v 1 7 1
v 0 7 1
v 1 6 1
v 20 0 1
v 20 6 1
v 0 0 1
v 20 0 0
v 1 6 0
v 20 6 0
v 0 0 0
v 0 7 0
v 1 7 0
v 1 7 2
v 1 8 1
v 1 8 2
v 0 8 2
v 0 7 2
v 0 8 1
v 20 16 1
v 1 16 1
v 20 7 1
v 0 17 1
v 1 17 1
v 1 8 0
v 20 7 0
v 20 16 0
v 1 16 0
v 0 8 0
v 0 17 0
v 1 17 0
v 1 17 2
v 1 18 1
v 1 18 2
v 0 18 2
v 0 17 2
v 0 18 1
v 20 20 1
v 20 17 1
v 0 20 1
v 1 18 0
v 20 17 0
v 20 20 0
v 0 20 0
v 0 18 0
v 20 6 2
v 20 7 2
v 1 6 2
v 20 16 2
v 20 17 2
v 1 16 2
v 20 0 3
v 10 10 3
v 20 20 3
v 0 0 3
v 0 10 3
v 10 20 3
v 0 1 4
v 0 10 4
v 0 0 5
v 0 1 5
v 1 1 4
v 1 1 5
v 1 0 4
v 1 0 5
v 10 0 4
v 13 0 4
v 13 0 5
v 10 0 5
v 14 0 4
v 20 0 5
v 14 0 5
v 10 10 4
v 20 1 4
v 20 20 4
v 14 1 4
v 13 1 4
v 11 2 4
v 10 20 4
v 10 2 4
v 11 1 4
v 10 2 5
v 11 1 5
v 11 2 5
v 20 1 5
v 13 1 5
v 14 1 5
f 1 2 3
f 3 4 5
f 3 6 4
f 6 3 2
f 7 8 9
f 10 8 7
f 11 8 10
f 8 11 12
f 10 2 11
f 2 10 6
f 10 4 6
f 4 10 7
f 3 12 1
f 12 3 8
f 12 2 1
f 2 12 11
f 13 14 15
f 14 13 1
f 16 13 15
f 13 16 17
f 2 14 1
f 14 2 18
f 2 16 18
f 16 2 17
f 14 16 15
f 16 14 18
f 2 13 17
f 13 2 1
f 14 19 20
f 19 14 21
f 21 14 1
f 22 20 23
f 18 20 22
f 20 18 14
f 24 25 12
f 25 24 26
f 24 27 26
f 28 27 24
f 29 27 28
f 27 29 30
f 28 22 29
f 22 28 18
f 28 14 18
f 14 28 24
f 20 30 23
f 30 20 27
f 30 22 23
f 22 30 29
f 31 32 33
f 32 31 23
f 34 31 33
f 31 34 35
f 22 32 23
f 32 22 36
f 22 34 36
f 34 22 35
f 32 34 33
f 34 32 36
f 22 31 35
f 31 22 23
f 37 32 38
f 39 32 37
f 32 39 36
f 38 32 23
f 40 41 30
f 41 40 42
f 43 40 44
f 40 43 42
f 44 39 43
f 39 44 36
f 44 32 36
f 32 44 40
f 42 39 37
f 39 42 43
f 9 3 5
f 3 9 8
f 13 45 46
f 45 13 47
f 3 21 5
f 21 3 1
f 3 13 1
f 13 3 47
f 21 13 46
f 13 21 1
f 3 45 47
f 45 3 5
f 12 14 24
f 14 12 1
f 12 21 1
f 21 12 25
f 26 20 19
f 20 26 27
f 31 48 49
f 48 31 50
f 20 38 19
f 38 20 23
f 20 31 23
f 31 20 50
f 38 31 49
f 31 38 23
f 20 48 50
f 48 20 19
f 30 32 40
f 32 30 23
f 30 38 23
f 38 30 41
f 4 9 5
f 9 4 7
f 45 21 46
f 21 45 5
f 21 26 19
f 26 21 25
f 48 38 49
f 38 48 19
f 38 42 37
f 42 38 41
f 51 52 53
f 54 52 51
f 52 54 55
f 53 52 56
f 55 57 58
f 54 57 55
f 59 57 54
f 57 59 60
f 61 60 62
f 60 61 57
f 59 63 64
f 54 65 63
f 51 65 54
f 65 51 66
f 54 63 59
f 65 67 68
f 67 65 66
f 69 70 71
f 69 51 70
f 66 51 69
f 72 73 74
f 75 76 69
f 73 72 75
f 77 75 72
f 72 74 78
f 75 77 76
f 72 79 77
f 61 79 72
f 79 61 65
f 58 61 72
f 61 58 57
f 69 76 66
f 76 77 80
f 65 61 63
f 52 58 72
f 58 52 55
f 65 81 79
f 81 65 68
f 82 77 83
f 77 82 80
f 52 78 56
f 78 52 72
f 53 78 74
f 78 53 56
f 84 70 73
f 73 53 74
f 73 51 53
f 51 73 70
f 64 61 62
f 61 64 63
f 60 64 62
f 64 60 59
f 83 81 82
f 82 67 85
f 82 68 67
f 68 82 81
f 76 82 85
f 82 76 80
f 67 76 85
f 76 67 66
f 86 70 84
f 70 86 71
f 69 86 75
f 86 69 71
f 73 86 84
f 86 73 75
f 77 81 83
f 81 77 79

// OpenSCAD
union() {
    translate([0, 0, 0]) cube([1, 1, 1]);
    translate([0, 1, 0]) cube([1, 1, 1]);
    translate([0, 2, 0]) cube([1, 1, 1]);
    translate([0, 3, 0]) cube([1, 1, 1]);
    translate([0, 4, 0]) cube([1, 1, 1]);
    translate([0, 5, 0]) cube([1, 1, 1]);
    translate([0, 6, 0]) cube([1, 1, 1]);
    translate([0, 7, 1]) cube([1, 1, 1]);
    translate([0, 8, 0]) cube([1, 1, 1]);
    translate([0, 9, 0]) cube([1, 1, 1]);
    translate([0, 10, 0]) cube([1, 1, 1]);
    translate([0, 11, 0]) cube([1, 1, 1]);
    translate([0, 12, 0]) cube([1, 1, 1]);
    translate([0, 13, 0]) cube([1, 1, 1]);
    translate([0, 14, 0]) cube([1, 1, 1]);
    translate([0, 15, 0]) cube([1, 1, 1]);
    translate([0, 16, 0]) cube([1, 1, 1]);
    translate([0, 17, 1]) cube([1, 1, 1]);
    translate([0, 18, 0]) cube([1, 1, 1]);
    translate([0, 19, 0]) cube([1, 1, 1]);
    translate([1, 0, 0]) cube([1, 1, 1]);
    translate([1, 1, 0]) cube([1, 1, 1]);
    translate([1, 2, 0]) cube([1, 1, 1]);
    translate([1, 3, 0]) cube([1, 1, 1]);
    translate([1, 4, 0]) cube([1, 1, 1]);
    translate([1, 5, 0]) cube([1, 1, 1]);
    translate([1, 6, 1]) cube([1, 1, 1]);
    translate([1, 7, 0]) cube([1, 1, 1]);
    translate([1, 8, 0]) cube([1, 1, 1]);
    translate([1, 9, 0]) cube([1, 1, 1]);
    translate([1, 10, 0]) cube([1, 1, 1]);
    translate([1, 11, 0]) cube([1, 1, 1]);
    translate([1, 12, 0]) cube([1, 1, 1]);
    translate([1, 13, 0]) cube([1, 1, 1]);
    translate([1, 14, 0]) cube([1, 1, 1]);
    translate([1, 15, 0]) cube([1, 1, 1]);
    translate([1, 16, 1]) cube([1, 1, 1]);
    translate([1, 17, 0]) cube([1, 1, 1]);
    translate([1, 18, 0]) cube([1, 1, 1]);
    translate([1, 19, 0]) cube([1, 1, 1]);
    translate([2, 0, 0]) cube([1, 1, 1]);
    translate([2, 1, 0]) cube([1, 1, 1]);
    translate([2, 2, 0]) cube([1, 1, 1]);
    translate([2, 3, 0]) cube([1, 1, 1]);
    translate([2, 4, 0]) cube([1, 1, 1]);
    translate([2, 5, 0]) cube([1, 1, 1]);
    translate([2, 6, 1]) cube([1, 1, 1]);
    translate([2, 7, 0]) cube([1, 1, 1]);
    translate([2, 8, 0]) cube([1, 1, 1]);
    translate([2, 9, 0]) cube([1, 1, 1]);
    translate([2, 10, 0]) cube([1, 1, 1]);
    translate([2, 11, 0]) cube([1, 1, 1]);
    translate([2, 12, 0]) cube([1, 1, 1]);
    translate([2, 13, 0]) cube([1, 1, 1]);
    translate([2, 14, 0]) cube([1, 1, 1]);
    translate([2, 15, 0]) cube([1, 1, 1]);
    translate([2, 16, 1]) cube([1, 1, 1]);
    translate([2, 17, 0]) cube([1, 1, 1]);
    translate([2, 18, 0]) cube([1, 1, 1]);
    translate([2, 19, 0]) cube([1, 1, 1]);
    translate([3, 0, 0]) cube([1, 1, 1]);
    translate([3, 1, 0]) cube([1, 1, 1]);
    translate([3, 2, 0]) cube([1, 1, 1]);
    translate([3, 3, 0]) cube([1, 1, 1]);
    translate([3, 4, 0]) cube([1, 1, 1]);
    translate([3, 5, 0]) cube([1, 1, 1]);
    translate([3, 6, 1]) cube([1, 1, 1]);
    translate([3, 7, 0]) cube([1, 1, 1]);
    translate([3, 8, 0]) cube([1, 1, 1]);
    translate([3, 9, 0]) cube([1, 1, 1]);
    translate([3, 10, 0]) cube([1, 1, 1]);
    translate([3, 11, 0]) cube([1, 1, 1]);
    translate([3, 12, 0]) cube([1, 1, 1]);
    translate([3, 13, 0]) cube([1, 1, 1]);
    translate([3, 14, 0]) cube([1, 1, 1]);
    translate([3, 15, 0]) cube([1, 1, 1]);
    translate([3, 16, 1]) cube([1, 1, 1]);
    translate([3, 17, 0]) cube([1, 1, 1]);
    translate([3, 18, 0]) cube([1, 1, 1]);
    translate([3, 19, 0]) cube([1, 1, 1]);
    translate([4, 0, 0]) cube([1, 1, 1]);
    translate([4, 1, 0]) cube([1, 1, 1]);
    translate([4, 2, 0]) cube([1, 1, 1]);
    translate([4, 3, 0]) cube([1, 1, 1]);
    translate([4, 4, 0]) cube([1, 1, 1]);
    translate([4, 5, 0]) cube([1, 1, 1]);
    translate([4, 6, 1]) cube([1, 1, 1]);
    translate([4, 7, 0]) cube([1, 1, 1]);
    translate([4, 8, 0]) cube([1, 1, 1]);
    translate([4, 9, 0]) cube([1, 1, 1]);
    translate([4, 10, 0]) cube([1, 1, 1]);
    translate([4, 11, 0]) cube([1, 1, 1]);
    translate([4, 12, 0]) cube([1, 1, 1]);
    translate([4, 13, 0]) cube([1, 1, 1]);
    translate([4, 14, 0]) cube([1, 1, 1]);
    translate([4, 15, 0]) cube([1, 1, 1]);
    translate([4, 16, 1]) cube([1, 1, 1]);
    translate([4, 17, 0]) cube([1, 1, 1]);
    translate([4, 18, 0]) cube([1, 1, 1]);
    translate([4, 19, 0]) cube([1, 1, 1]);
    translate([5, 0, 0]) cube([1, 1, 1]);
    translate([5, 1, 0]) cube([1, 1, 1]);
    translate([5, 2, 0]) cube([1, 1, 1]);
    translate([5, 3, 0]) cube([1, 1, 1]);
    translate([5, 4, 0]) cube([1, 1, 1]);
    translate([5, 5, 0]) cube([1, 1, 1]);
    translate([5, 6, 1]) cube([1, 1, 1]);
    translate([5, 7, 0]) cube([1, 1, 1]);
    translate([5, 8, 0]) cube([1, 1, 1]);
    translate([5, 9, 0]) cube([1, 1, 1]);
    translate([5, 10, 0]) cube([1, 1, 1]);
    translate([5, 11, 0]) cube([1, 1, 1]);
    translate([5, 12, 0]) cube([1, 1, 1]);
    translate([5, 13, 0]) cube([1, 1, 1]);
    translate([5, 14, 0]) cube([1, 1, 1]);
    translate([5, 15, 0]) cube([1, 1, 1]);
    translate([5, 16, 1]) cube([1, 1, 1]);
    translate([5, 17, 0]) cube([1, 1, 1]);
    translate([5, 18, 0]) cube([1, 1, 1]);
    translate([5, 19, 0]) cube([1, 1, 1]);
    translate([6, 0, 0]) cube([1, 1, 1]);
    translate([6, 1, 0]) cube([1, 1, 1]);
    translate([6, 2, 0]) cube([1, 1, 1]);
    translate([6, 3, 0]) cube([1, 1, 1]);
    translate([6, 4, 0]) cube([1, 1, 1]);
    translate([6, 5, 0]) cube([1, 1, 1]);
    translate([6, 6, 1]) cube([1, 1, 1]);
    translate([6, 7, 0]) cube([1, 1, 1]);
    translate([6, 8, 0]) cube([1, 1, 1]);
    translate([6, 9, 0]) cube([1, 1, 1]);
    translate([6, 10, 0]) cube([1, 1, 1]);
    translate([6, 11, 0]) cube([1, 1, 1]);
    translate([6, 12, 0]) cube([1, 1, 1]);
    translate([6, 13, 0]) cube([1, 1, 1]);
    translate([6, 14, 0]) cube([1, 1, 1]);
    translate([6, 15, 0]) cube([1, 1, 1]);
    translate([6, 16, 1]) cube([1, 1, 1]);
    translate([6, 17, 0]) cube([1, 1, 1]);
    translate([6, 18, 0]) cube([1, 1, 1]);
    translate([6, 19, 0]) cube([1, 1, 1]);
    translate([7, 0, 0]) cube([1, 1, 1]);
    translate([7, 1, 0]) cube([1, 1, 1]);
    translate([7, 2, 0]) cube([1, 1, 1]);
    translate([7, 3, 0]) cube([1, 1, 1]);
    translate([7, 4, 0]) cube([1, 1, 1]);
    translate([7, 5, 0]) cube([1, 1, 1]);
    translate([7, 6, 1]) cube([1, 1, 1]);
    translate([7, 7, 0]) cube([1, 1, 1]);
    translate([7, 8, 0]) cube([1, 1, 1]);
    translate([7, 9, 0]) cube([1, 1, 1]);
    translate([7, 10, 0]) cube([1, 1, 1]);
    translate([7, 11, 0]) cube([1, 1, 1]);
    translate([7, 12, 0]) cube([1, 1, 1]);
    translate([7, 13, 0]) cube([1, 1, 1]);
    translate([7, 14, 0]) cube([1, 1, 1]);
    translate([7, 15, 0]) cube([1, 1, 1]);
    translate([7, 16, 1]) cube([1, 1, 1]);
    translate([7, 17, 0]) cube([1, 1, 1]);
    translate([7, 18, 0]) cube([1, 1, 1]);
    translate([7, 19, 0]) cube([1, 1, 1]);
    translate([8, 0, 0]) cube([1, 1, 1]);
    translate([8, 1, 0]) cube([1, 1, 1]);
    translate([8, 2, 0]) cube([1, 1, 1]);
    translate([8, 3, 0]) cube([1, 1, 1]);
    translate([8, 4, 0]) cube([1, 1, 1]);
    translate([8, 5, 0]) cube([1, 1, 1]);
    translate([8, 6, 1]) cube([1, 1, 1]);
    translate([8, 7, 0]) cube([1, 1, 1]);
    translate([8, 8, 0]) cube([1, 1, 1]);
    translate([8, 9, 0]) cube([1, 1, 1]);
    translate([8, 10, 0]) cube([1, 1, 1]);
    translate([8, 11, 0]) cube([1, 1, 1]);
    translate([8, 12, 0]) cube([1, 1, 1]);
    translate([8, 13, 0]) cube([1, 1, 1]);
    translate([8, 14, 0]) cube([1, 1, 1]);
    translate([8, 15, 0]) cube([1, 1, 1]);
    translate([8, 16, 1]) cube([1, 1, 1]);
    translate([8, 17, 0]) cube([1, 1, 1]);
    translate([8, 18, 0]) cube([1, 1, 1]);
    translate([8, 19, 0]) cube([1, 1, 1]);
    translate([9, 0, 0]) cube([1, 1, 1]);
    translate([9, 1, 0]) cube([1, 1, 1]);
    translate([9, 2, 0]) cube([1, 1, 1]);
    translate([9, 3, 0]) cube([1, 1, 1]);
    translate([9, 4, 0]) cube([1, 1, 1]);
    translate([9, 5, 0]) cube([1, 1, 1]);
    translate([9, 6, 1]) cube([1, 1, 1]);
    translate([9, 7, 0]) cube([1, 1, 1]);
    translate([9, 8, 0]) cube([1, 1, 1]);
    translate([9, 9, 0]) cube([1, 1, 1]);
    translate([9, 10, 0]) cube([1, 1, 1]);
    translate([9, 11, 0]) cube([1, 1, 1]);
    translate([9, 12, 0]) cube([1, 1, 1]);
    translate([9, 13, 0]) cube([1, 1, 1]);
    translate([9, 14, 0]) cube([1, 1, 1]);
    translate([9, 15, 0]) cube([1, 1, 1]);
    translate([9, 16, 1]) cube([1, 1, 1]);
    translate([9, 17, 0]) cube([1, 1, 1]);
    translate([9, 18, 0]) cube([1, 1, 1]);
    translate([9, 19, 0]) cube([1, 1, 1]);
    translate([10, 0, 0]) cube([1, 1, 1]);
    translate([10, 1, 0]) cube([1, 1, 1]);
    translate([10, 2, 0]) cube([1, 1, 1]);
    translate([10, 3, 0]) cube([1, 1, 1]);
    translate([10, 4, 0]) cube([1, 1, 1]);
    translate([10, 5, 0]) cube([1, 1, 1]);
    translate([10, 6, 1]) cube([1, 1, 1]);
    translate([10, 7, 0]) cube([1, 1, 1]);
    translate([10, 8, 0]) cube([1, 1, 1]);
    translate([10, 9, 0]) cube([1, 1, 1]);
    translate([10, 10, 0]) cube([1, 1, 1]);
    translate([10, 11, 0]) cube([1, 1, 1]);
    translate([10, 12, 0]) cube([1, 1, 1]);
    translate([10, 13, 0]) cube([1, 1, 1]);
    translate([10, 14, 0]) cube([1, 1, 1]);
    translate([10, 15, 0]) cube([1, 1, 1]);
    translate([10, 16, 1]) cube([1, 1, 1]);
    translate([10, 17, 0]) cube([1, 1, 1]);
    translate([10, 18, 0]) cube([1, 1, 1]);
    translate([10, 19, 0]) cube([1, 1, 1]);
    translate([11, 0, 0]) cube([1, 1, 1]);
    translate([11, 1, 0]) cube([1, 1, 1]);
    translate([11, 2, 0]) cube([1, 1, 1]);
    translate([11, 3, 0]) cube([1, 1, 1]);
    translate([11, 4, 0]) cube([1, 1, 1]);
    translate([11, 5, 0]) cube([1, 1, 1]);
    translate([11, 6, 1]) cube([1, 1, 1]);
    translate([11, 7, 0]) cube([1, 1, 1]);
    translate([11, 8, 0]) cube([1, 1, 1]);
    translate([11, 9, 0]) cube([1, 1, 1]);
    translate([11, 10, 0]) cube([1, 1, 1]);
    translate([11, 11, 0]) cube([1, 1, 1]);
    translate([11, 12, 0]) cube([1, 1, 1]);
    translate([11, 13, 0]) cube([1, 1, 1]);
    translate([11, 14, 0]) cube([1, 1, 1]);
    translate([11, 15, 0]) cube([1, 1, 1]);
    translate([11, 16, 1]) cube([1, 1, 1]);
    translate([11, 17, 0]) cube([1, 1, 1]);
    translate([11, 18, 0]) cube([1, 1, 1]);
    translate([11, 19, 0]) cube([1, 1, 1]);
    translate([12, 0, 0]) cube([1, 1, 1]);
    translate([12, 1, 0]) cube([1, 1, 1]);
    translate([12, 2, 0]) cube([1, 1, 1]);
    translate([12, 3, 0]) cube([1, 1, 1]);
    translate([12, 4, 0]) cube([1, 1, 1]);
    translate([12, 5, 0]) cube([1, 1, 1]);
    translate([12, 6, 1]) cube([1, 1, 1]);
    translate([12, 7, 0]) cube([1, 1, 1]);
    translate([12, 8, 0]) cube([1, 1, 1]);
    translate([12, 9, 0]) cube([1, 1, 1]);
    translate([12, 10, 0]) cube([1, 1, 1]);
    translate([12, 11, 0]) cube([1, 1, 1]);
    translate([12, 12, 0]) cube([1, 1, 1]);
    translate([12, 13, 0]) cube([1, 1, 1]);
    translate([12, 14, 0]) cube([1, 1, 1]);
    translate([12, 15, 0]) cube([1, 1, 1]);
    translate([12, 16, 1]) cube([1, 1, 1]);
    translate([12, 17, 0]) cube([1, 1, 1]);
    translate([12, 18, 0]) cube([1, 1, 1]);
    translate([12, 19, 0]) cube([1, 1, 1]);
    translate([13, 0, 0]) cube([1, 1, 1]);
    translate([13, 1, 0]) cube([1, 1, 1]);
    translate([13, 2, 0]) cube([1, 1, 1]);
    translate([13, 3, 0]) cube([1, 1, 1]);
    translate([13, 4, 0]) cube([1, 1, 1]);
    translate([13, 5, 0]) cube([1, 1, 1]);
    translate([13, 6, 1]) cube([1, 1, 1]);
    translate([13, 7, 0]) cube([1, 1, 1]);
    translate([13, 8, 0]) cube([1, 1, 1]);
    translate([13, 9, 0]) cube([1, 1, 1]);
    translate([13, 10, 0]) cube([1, 1, 1]);
    translate([13, 11, 0]) cube([1, 1, 1]);
    translate([13, 12, 0]) cube([1, 1, 1]);
    translate([13, 13, 0]) cube([1, 1, 1]);
    translate([13, 14, 0]) cube([1, 1, 1]);
    translate([13, 15, 0]) cube([1, 1, 1]);
    translate([13, 16, 1]) cube([1, 1, 1]);
    translate([13, 17, 0]) cube([1, 1, 1]);
    translate([13, 18, 0]) cube([1, 1, 1]);
    translate([13, 19, 0]) cube([1, 1, 1]);
    translate([14, 0, 0]) cube([1, 1, 1]);
    translate([14, 1, 0]) cube([1, 1, 1]);
    translate([14, 2, 0]) cube([1, 1, 1]);
    translate([14, 3, 0]) cube([1, 1, 1]);
    translate([14, 4, 0]) cube([1, 1, 1]);
    translate([14, 5, 0]) cube([1, 1, 1]);
    translate([14, 6, 1]) cube([1, 1, 1]);
    translate([14, 7, 0]) cube([1, 1, 1]);
    translate([14, 8, 0]) cube([1, 1, 1]);
    translate([14, 9, 0]) cube([1, 1, 1]);
    translate([14, 10, 0]) cube([1, 1, 1]);
    translate([14, 11, 0]) cube([1, 1, 1]);
    translate([14, 12, 0]) cube([1, 1, 1]);
    translate([14, 13, 0]) cube([1, 1, 1]);
    translate([14, 14, 0]) cube([1, 1, 1]);
    translate([14, 15, 0]) cube([1, 1, 1]);
    translate([14, 16, 1]) cube([1, 1, 1]);
    translate([14, 17, 0]) cube([1, 1, 1]);
    translate([14, 18, 0]) cube([1, 1, 1]);
    translate([14, 19, 0]) cube([1, 1, 1]);
    translate([15, 0, 0]) cube([1, 1, 1]);
    translate([15, 1, 0]) cube([1, 1, 1]);
    translate([15, 2, 0]) cube([1, 1, 1]);
    translate([15, 3, 0]) cube([1, 1, 1]);
    translate([15, 4, 0]) cube([1, 1, 1]);
    translate([15, 5, 0]) cube([1, 1, 1]);
    translate([15, 6, 1]) cube([1, 1, 1]);
    translate([15, 7, 0]) cube([1, 1, 1]);
    translate([15, 8, 0]) cube([1, 1, 1]);
    translate([15, 9, 0]) cube([1, 1, 1]);
    translate([15, 10, 0]) cube([1, 1, 1]);
    translate([15, 11, 0]) cube([1, 1, 1]);
    translate([15, 12, 0]) cube([1, 1, 1]);
    translate([15, 13, 0]) cube([1, 1, 1]);
    translate([15, 14, 0]) cube([1, 1, 1]);
    translate([15, 15, 0]) cube([1, 1, 1]);
    translate([15, 16, 1]) cube([1, 1, 1]);
    translate([15, 17, 0]) cube([1, 1, 1]);
    translate([15, 18, 0]) cube([1, 1, 1]);
    translate([15, 19, 0]) cube([1, 1, 1]);
    translate([16, 0, 0]) cube([1, 1, 1]);
    translate([16, 1, 0]) cube([1, 1, 1]);
    translate([16, 2, 0]) cube([1, 1, 1]);
    translate([16, 3, 0]) cube([1, 1, 1]);
    translate([16, 4, 0]) cube([1, 1, 1]);
    translate([16, 5, 0]) cube([1, 1, 1]);
    translate([16, 6, 1]) cube([1, 1, 1]);
    translate([16, 7, 0]) cube([1, 1, 1]);
    translate([16, 8, 0]) cube([1, 1, 1]);
    translate([16, 9, 0]) cube([1, 1, 1]);
    translate([16, 10, 0]) cube([1, 1, 1]);
    translate([16, 11, 0]) cube([1, 1, 1]);
    translate([16, 12, 0]) cube([1, 1, 1]);
    translate([16, 13, 0]) cube([1, 1, 1]);
    translate([16, 14, 0]) cube([1, 1, 1]);
    translate([16, 15, 0]) cube([1, 1, 1]);
    translate([16, 16, 1]) cube([1, 1, 1]);
    translate([16, 17, 0]) cube([1, 1, 1]);
    translate([16, 18, 0]) cube([1, 1, 1]);
    translate([16, 19, 0]) cube([1, 1, 1]);
    translate([17, 0, 0]) cube([1, 1, 1]);
    translate([17, 1, 0]) cube([1, 1, 1]);
    translate([17, 2, 0]) cube([1, 1, 1]);
    translate([17, 3, 0]) cube([1, 1, 1]);
    translate([17, 4, 0]) cube([1, 1, 1]);
    translate([17, 5, 0]) cube([1, 1, 1]);
    translate([17, 6, 1]) cube([1, 1, 1]);
    translate([17, 7, 0]) cube([1, 1, 1]);
    translate([17, 8, 0]) cube([1, 1, 1]);
    translate([17, 9, 0]) cube([1, 1, 1]);
    translate([17, 10, 0]) cube([1, 1, 1]);
    translate([17, 11, 0]) cube([1, 1, 1]);
    translate([17, 12, 0]) cube([1, 1, 1]);
    translate([17, 13, 0]) cube([1, 1, 1]);
    translate([17, 14, 0]) cube([1, 1, 1]);
    translate([17, 15, 0]) cube([1, 1, 1]);
    translate([17, 16, 1]) cube([1, 1, 1]);
    translate([17, 17, 0]) cube([1, 1, 1]);
    translate([17, 18, 0]) cube([1, 1, 1]);
    translate([17, 19, 0]) cube([1, 1, 1]);
    translate([18, 0, 0]) cube([1, 1, 1]);
    translate([18, 1, 0]) cube([1, 1, 1]);
    translate([18, 2, 0]) cube([1, 1, 1]);
    translate([18, 3, 0]) cube([1, 1, 1]);
    translate([18, 4, 0]) cube([1, 1, 1]);
    translate([18, 5, 0]) cube([1, 1, 1]);
    translate([18, 6, 1]) cube([1, 1, 1]);
    translate([18, 7, 0]) cube([1, 1, 1]);
    translate([18, 8, 0]) cube([1, 1, 1]);
    translate([18, 9, 0]) cube([1, 1, 1]);
    translate([18, 10, 0]) cube([1, 1, 1]);
    translate([18, 11, 0]) cube([1, 1, 1]);
    translate([18, 12, 0]) cube([1, 1, 1]);
    translate([18, 13, 0]) cube([1, 1, 1]);
    translate([18, 14, 0]) cube([1, 1, 1]);
    translate([18, 15, 0]) cube([1, 1, 1]);
    translate([18, 16, 1]) cube([1, 1, 1]);
    translate([18, 17, 0]) cube([1, 1, 1]);
    translate([18, 18, 0]) cube([1, 1, 1]);
    translate([18, 19, 0]) cube([1, 1, 1]);
    translate([19, 0, 0]) cube([1, 1, 1]);
    translate([19, 1, 0]) cube([1, 1, 1]);
    translate([19, 2, 0]) cube([1, 1, 1]);
    translate([19, 3, 0]) cube([1, 1, 1]);
    translate([19, 4, 0]) cube([1, 1, 1]);
    translate([19, 5, 0]) cube([1, 1, 1]);
    translate([19, 6, 1]) cube([1, 1, 1]);
    translate([19, 7, 0]) cube([1, 1, 1]);
    translate([19, 8, 0]) cube([1, 1, 1]);
    translate([19, 9, 0]) cube([1, 1, 1]);
    translate([19, 10, 0]) cube([1, 1, 1]);
    translate([19, 11, 0]) cube([1, 1, 1]);
    translate([19, 12, 0]) cube([1, 1, 1]);
    translate([19, 13, 0]) cube([1, 1, 1]);
    translate([19, 14, 0]) cube([1, 1, 1]);
    translate([19, 15, 0]) cube([1, 1, 1]);
    translate([19, 16, 1]) cube([1, 1, 1]);
    translate([19, 17, 0]) cube([1, 1, 1]);
    translate([19, 18, 0]) cube([1, 1, 1]);
    translate([19, 19, 0]) cube([1, 1, 1]);
    translate([0, 0, 3]) cube([1, 1, 1]);
    translate([0, 1, 3]) cube([1, 1, 1]);
    translate([0, 2, 3]) cube([1, 1, 1]);
    translate([0, 3, 3]) cube([1, 1, 1]);
    translate([0, 4, 3]) cube([1, 1, 1]);
    translate([0, 5, 3]) cube([1, 1, 1]);
    translate([0, 6, 3]) cube([1, 1, 1]);
    translate([0, 7, 3]) cube([1, 1, 1]);
    translate([0, 8, 3]) cube([1, 1, 1]);
    translate([0, 9, 3]) cube([1, 1, 1]);
    translate([1, 0, 3]) cube([1, 1, 1]);
    translate([1, 1, 3]) cube([1, 1, 1]);
    translate([1, 2, 3]) cube([1, 1, 1]);
    translate([1, 3, 3]) cube([1, 1, 1]);
    translate([1, 4, 3]) cube([1, 1, 1]);
    translate([1, 5, 3]) cube([1, 1, 1]);
    translate([1, 6, 3]) cube([1, 1, 1]);
    translate([1, 7, 3]) cube([1, 1, 1]);
    translate([1, 8, 3]) cube([1, 1, 1]);
    translate([1, 9, 3]) cube([1, 1, 1]);
    translate([2, 0, 3]) cube([1, 1, 1]);
    translate([2, 1, 3]) cube([1, 1, 1]);
    translate([2, 2, 3]) cube([1, 1, 1]);
    translate([2, 3, 3]) cube([1, 1, 1]);
    translate([2, 4, 3]) cube([1, 1, 1]);
    translate([2, 5, 3]) cube([1, 1, 1]);
    translate([2, 6, 3]) cube([1, 1, 1]);
    translate([2, 7, 3]) cube([1, 1, 1]);
    translate([2, 8, 3]) cube([1, 1, 1]);
    translate([2, 9, 3]) cube([1, 1, 1]);
    translate([3, 0, 3]) cube([1, 1, 1]);
    translate([3, 1, 3]) cube([1, 1, 1]);
    translate([3, 2, 3]) cube([1, 1, 1]);
    translate([3, 3, 3]) cube([1, 1, 1]);
    translate([3, 4, 3]) cube([1, 1, 1]);
    translate([3, 5, 3]) cube([1, 1, 1]);
    translate([3, 6, 3]) cube([1, 1, 1]);
    translate([3, 7, 3]) cube([1, 1, 1]);
    translate([3, 8, 3]) cube([1, 1, 1]);
    translate([3, 9, 3]) cube([1, 1, 1]);
    translate([4, 0, 3]) cube([1, 1, 1]);
    translate([4, 1, 3]) cube([1, 1, 1]);
    translate([4, 2, 3]) cube([1, 1, 1]);
    translate([4, 3, 3]) cube([1, 1, 1]);
    translate([4, 4, 3]) cube([1, 1, 1]);
    translate([4, 5, 3]) cube([1, 1, 1]);
    translate([4, 6, 3]) cube([1, 1, 1]);
    translate([4, 7, 3]) cube([1, 1, 1]);
    translate([4, 8, 3]) cube([1, 1, 1]);
    translate([4, 9, 3]) cube([1, 1, 1]);
    translate([5, 0, 3]) cube([1, 1, 1]);
    translate([5, 1, 3]) cube([1, 1, 1]);
    translate([5, 2, 3]) cube([1, 1, 1]);
    translate([5, 3, 3]) cube([1, 1, 1]);
    translate([5, 4, 3]) cube([1, 1, 1]);
    translate([5, 5, 3]) cube([1, 1, 1]);
    translate([5, 6, 3]) cube([1, 1, 1]);
    translate([5, 7, 3]) cube([1, 1, 1]);
    translate([5, 8, 3]) cube([1, 1, 1]);
    translate([5, 9, 3]) cube([1, 1, 1]);
    translate([6, 0, 3]) cube([1, 1, 1]);
    translate([6, 1, 3]) cube([1, 1, 1]);
    translate([6, 2, 3]) cube([1, 1, 1]);
    translate([6, 3, 3]) cube([1, 1, 1]);
    translate([6, 4, 3]) cube([1, 1, 1]);
    translate([6, 5, 3]) cube([1, 1, 1]);
    translate([6, 6, 3]) cube([1, 1, 1]);
    translate([6, 7, 3]) cube([1, 1, 1]);
    translate([6, 8, 3]) cube([1, 1, 1]);
    translate([6, 9, 3]) cube([1, 1, 1]);
    translate([7, 0, 3]) cube([1, 1, 1]);
    translate([7, 1, 3]) cube([1, 1, 1]);
    translate([7, 2, 3]) cube([1, 1, 1]);
    translate([7, 3, 3]) cube([1, 1, 1]);
    translate([7, 4, 3]) cube([1, 1, 1]);
    translate([7, 5, 3]) cube([1, 1, 1]);
    translate([7, 6, 3]) cube([1, 1, 1]);
    translate([7, 7, 3]) cube([1, 1, 1]);
    translate([7, 8, 3]) cube([1, 1, 1]);
    translate([7, 9, 3]) cube([1, 1, 1]);
    translate([8, 0, 3]) cube([1, 1, 1]);
    translate([8, 1, 3]) cube([1, 1, 1]);
    translate([8, 2, 3]) cube([1, 1, 1]);
    translate([8, 3, 3]) cube([1, 1, 1]);
    translate([8, 4, 3]) cube([1, 1, 1]);
    translate([8, 5, 3]) cube([1, 1, 1]);
    translate([8, 6, 3]) cube([1, 1, 1]);
    translate([8, 7, 3]) cube([1, 1, 1]);
    translate([8, 8, 3]) cube([1, 1, 1]);
    translate([8, 9, 3]) cube([1, 1, 1]);
    translate([9, 0, 3]) cube([1, 1, 1]);
    translate([9, 1, 3]) cube([1, 1, 1]);
    translate([9, 2, 3]) cube([1, 1, 1]);
    translate([9, 3, 3]) cube([1, 1, 1]);
    translate([9, 4, 3]) cube([1, 1, 1]);
    translate([9, 5, 3]) cube([1, 1, 1]);
    translate([9, 6, 3]) cube([1, 1, 1]);
    translate([9, 7, 3]) cube([1, 1, 1]);
    translate([9, 8, 3]) cube([1, 1, 1]);
    translate([9, 9, 3]) cube([1, 1, 1]);
    translate([10, 0, 3]) cube([1, 1, 1]);
    translate([10, 1, 3]) cube([1, 1, 1]);
    translate([10, 2, 3]) cube([1, 1, 1]);
    translate([10, 3, 3]) cube([1, 1, 1]);
    translate([10, 4, 3]) cube([1, 1, 1]);
    translate([10, 5, 3]) cube([1, 1, 1]);
    translate([10, 6, 3]) cube([1, 1, 1]);
    translate([10, 7, 3]) cube([1, 1, 1]);
    translate([10, 8, 3]) cube([1, 1, 1]);
    translate([10, 9, 3]) cube([1, 1, 1]);
    translate([10, 10, 3]) cube([1, 1, 1]);
    translate([10, 11, 3]) cube([1, 1, 1]);
    translate([10, 12, 3]) cube([1, 1, 1]);
    translate([10, 13, 3]) cube([1, 1, 1]);
    translate([10, 14, 3]) cube([1, 1, 1]);
    translate([10, 15, 3]) cube([1, 1, 1]);
    translate([10, 16, 3]) cube([1, 1, 1]);
    translate([10, 17, 3]) cube([1, 1, 1]);
    translate([10, 18, 3]) cube([1, 1, 1]);
    translate([10, 19, 3]) cube([1, 1, 1]);
    translate([11, 0, 3]) cube([1, 1, 1]);
    translate([11, 1, 3]) cube([1, 1, 1]);
    translate([11, 2, 3]) cube([1, 1, 1]);
    translate([11, 3, 3]) cube([1, 1, 1]);
    translate([11, 4, 3]) cube([1, 1, 1]);
    translate([11, 5, 3]) cube([1, 1, 1]);
    translate([11, 6, 3]) cube([1, 1, 1]);
    translate([11, 7, 3]) cube([1, 1, 1]);
    translate([11, 8, 3]) cube([1, 1, 1]);
    translate([11, 9, 3]) cube([1, 1, 1]);
    translate([11, 10, 3]) cube([1, 1, 1]);
    translate([11, 11, 3]) cube([1, 1, 1]);
    translate([11, 12, 3]) cube([1, 1, 1]);
    translate([11, 13, 3]) cube([1, 1, 1]);
    translate([11, 14, 3]) cube([1, 1, 1]);
    translate([11, 15, 3]) cube([1, 1, 1]);
    translate([11, 16, 3]) cube([1, 1, 1]);
    translate([11, 17, 3]) cube([1, 1, 1]);
    translate([11, 18, 3]) cube([1, 1, 1]);
    translate([11, 19, 3]) cube([1, 1, 1]);
    translate([12, 0, 3]) cube([1, 1, 1]);
    translate([12, 1, 3]) cube([1, 1, 1]);
    translate([12, 2, 3]) cube([1, 1, 1]);
    translate([12, 3, 3]) cube([1, 1, 1]);
    translate([12, 4, 3]) cube([1, 1, 1]);
    translate([12, 5, 3]) cube([1, 1, 1]);
    translate([12, 6, 3]) cube([1, 1, 1]);
    translate([12, 7, 3]) cube([1, 1, 1]);
    translate([12, 8, 3]) cube([1, 1, 1]);
    translate([12, 9, 3]) cube([1, 1, 1]);
    translate([12, 10, 3]) cube([1, 1, 1]);
    translate([12, 11, 3]) cube([1, 1, 1]);
    translate([12, 12, 3]) cube([1, 1, 1]);
    translate([12, 13, 3]) cube([1, 1, 1]);
    translate([12, 14, 3]) cube([1, 1, 1]);
    translate([12, 15, 3]) cube([1, 1, 1]);
    translate([12, 16, 3]) cube([1, 1, 1]);
    translate([12, 17, 3]) cube([1, 1, 1]);
    translate([12, 18, 3]) cube([1, 1, 1]);
    translate([12, 19, 3]) cube([1, 1, 1]);
    translate([13, 0, 3]) cube([1, 1, 1]);
    translate([13, 1, 3]) cube([1, 1, 1]);
    translate([13, 2, 3]) cube([1, 1, 1]);
    translate([13, 3, 3]) cube([1, 1, 1]);
    translate([13, 4, 3]) cube([1, 1, 1]);
    translate([13, 5, 3]) cube([1, 1, 1]);
    translate([13, 6, 3]) cube([1, 1, 1]);
    translate([13, 7, 3]) cube([1, 1, 1]);
    translate([13, 8, 3]) cube([1, 1, 1]);
    translate([13, 9, 3]) cube([1, 1, 1]);
    translate([13, 10, 3]) cube([1, 1, 1]);
    translate([13, 11, 3]) cube([1, 1, 1]);
    translate([13, 12, 3]) cube([1, 1, 1]);
    translate([13, 13, 3]) cube([1, 1, 1]);
    translate([13, 14, 3]) cube([1, 1, 1]);
    translate([13, 15, 3]) cube([1, 1, 1]);
    translate([13, 16, 3]) cube([1, 1, 1]);
    translate([13, 17, 3]) cube([1, 1, 1]);
    translate([13, 18, 3]) cube([1, 1, 1]);
    translate([13, 19, 3]) cube([1, 1, 1]);
    translate([14, 0, 3]) cube([1, 1, 1]);
    translate([14, 1, 3]) cube([1, 1, 1]);
    translate([14, 2, 3]) cube([1, 1, 1]);
    translate([14, 3, 3]) cube([1, 1, 1]);
    translate([14, 4, 3]) cube([1, 1, 1]);
    translate([14, 5, 3]) cube([1, 1, 1]);
    translate([14, 6, 3]) cube([1, 1, 1]);
    translate([14, 7, 3]) cube([1, 1, 1]);
    translate([14, 8, 3]) cube([1, 1, 1]);
    translate([14, 9, 3]) cube([1, 1, 1]);
    translate([14, 10, 3]) cube([1, 1, 1]);
    translate([14, 11, 3]) cube([1, 1, 1]);
    translate([14, 12, 3]) cube([1, 1, 1]);
    translate([14, 13, 3]) cube([1, 1, 1]);
    translate([14, 14, 3]) cube([1, 1, 1]);
    translate([14, 15, 3]) cube([1, 1, 1]);
    translate([14, 16, 3]) cube([1, 1, 1]);
    translate([14, 17, 3]) cube([1, 1, 1]);
    translate([14, 18, 3]) cube([1, 1, 1]);
    translate([14, 19, 3]) cube([1, 1, 1]);
    translate([15, 0, 3]) cube([1, 1, 1]);
    translate([15, 1, 3]) cube([1, 1, 1]);
    translate([15, 2, 3]) cube([1, 1, 1]);
    translate([15, 3, 3]) cube([1, 1, 1]);
    translate([15, 4, 3]) cube([1, 1, 1]);
    translate([15, 5, 3]) cube([1, 1, 1]);
    translate([15, 6, 3]) cube([1, 1, 1]);
    translate([15, 7, 3]) cube([1, 1, 1]);
    translate([15, 8, 3]) cube([1, 1, 1]);
    translate([15, 9, 3]) cube([1, 1, 1]);
    translate([15, 10, 3]) cube([1, 1, 1]);
    translate([15, 11, 3]) cube([1, 1, 1]);
    translate([15, 12, 3]) cube([1, 1, 1]);
    translate([15, 13, 3]) cube([1, 1, 1]);
    translate([15, 14, 3]) cube([1, 1, 1]);
    translate([15, 15, 3]) cube([1, 1, 1]);
    translate([15, 16, 3]) cube([1, 1, 1]);
    translate([15, 17, 3]) cube([1, 1, 1]);
    translate([15, 18, 3]) cube([1, 1, 1]);
    translate([15, 19, 3]) cube([1, 1, 1]);
    translate([16, 0, 3]) cube([1, 1, 1]);
    translate([16, 1, 3]) cube([1, 1, 1]);
    translate([16, 2, 3]) cube([1, 1, 1]);
    translate([16, 3, 3]) cube([1, 1, 1]);
    translate([16, 4, 3]) cube([1, 1, 1]);
    translate([16, 5, 3]) cube([1, 1, 1]);
    translate([16, 6, 3]) cube([1, 1, 1]);
    translate([16, 7, 3]) cube([1, 1, 1]);
    translate([16, 8, 3]) cube([1, 1, 1]);
    translate([16, 9, 3]) cube([1, 1, 1]);
    translate([16, 10, 3]) cube([1, 1, 1]);
    translate([16, 11, 3]) cube([1, 1, 1]);
    translate([16, 12, 3]) cube([1, 1, 1]);
    translate([16, 13, 3]) cube([1, 1, 1]);
    translate([16, 14, 3]) cube([1, 1, 1]);
    translate([16, 15, 3]) cube([1, 1, 1]);
    translate([16, 16, 3]) cube([1, 1, 1]);
    translate([16, 17, 3]) cube([1, 1, 1]);
    translate([16, 18, 3]) cube([1, 1, 1]);
    translate([16, 19, 3]) cube([1, 1, 1]);
    translate([17, 0, 3]) cube([1, 1, 1]);
    translate([17, 1, 3]) cube([1, 1, 1]);
    translate([17, 2, 3]) cube([1, 1, 1]);
    translate([17, 3, 3]) cube([1, 1, 1]);
    translate([17, 4, 3]) cube([1, 1, 1]);
    translate([17, 5, 3]) cube([1, 1, 1]);
    translate([17, 6, 3]) cube([1, 1, 1]);
    translate([17, 7, 3]) cube([1, 1, 1]);
    translate([17, 8, 3]) cube([1, 1, 1]);
    translate([17, 9, 3]) cube([1, 1, 1]);
    translate([17, 10, 3]) cube([1, 1, 1]);
    translate([17, 11, 3]) cube([1, 1, 1]);
    translate([17, 12, 3]) cube([1, 1, 1]);
    translate([17, 13, 3]) cube([1, 1, 1]);
    translate([17, 14, 3]) cube([1, 1, 1]);
    translate([17, 15, 3]) cube([1, 1, 1]);
    translate([17, 16, 3]) cube([1, 1, 1]);
    translate([17, 17, 3]) cube([1, 1, 1]);
    translate([17, 18, 3]) cube([1, 1, 1]);
    translate([17, 19, 3]) cube([1, 1, 1]);
    translate([18, 0, 3]) cube([1, 1, 1]);
    translate([18, 1, 3]) cube([1, 1, 1]);
    translate([18, 2, 3]) cube([1, 1, 1]);
    translate([18, 3, 3]) cube([1, 1, 1]);
    translate([18, 4, 3]) cube([1, 1, 1]);
    translate([18, 5, 3]) cube([1, 1, 1]);
    translate([18, 6, 3]) cube([1, 1, 1]);
    translate([18, 7, 3]) cube([1, 1, 1]);
    translate([18, 8, 3]) cube([1, 1, 1]);
    translate([18, 9, 3]) cube([1, 1, 1]);
    translate([18, 10, 3]) cube([1, 1, 1]);
    translate([18, 11, 3]) cube([1, 1, 1]);
    translate([18, 12, 3]) cube([1, 1, 1]);
    translate([18, 13, 3]) cube([1, 1, 1]);
    translate([18, 14, 3]) cube([1, 1, 1]);
    translate([18, 15, 3]) cube([1, 1, 1]);
    translate([18, 16, 3]) cube([1, 1, 1]);
    translate([18, 17, 3]) cube([1, 1, 1]);
    translate([18, 18, 3]) cube([1, 1, 1]);
    translate([18, 19, 3]) cube([1, 1, 1]);
    translate([19, 0, 3]) cube([1, 1, 1]);
    translate([19, 1, 3]) cube([1, 1, 1]);
    translate([19, 2, 3]) cube([1, 1, 1]);
    translate([19, 3, 3]) cube([1, 1, 1]);
    translate([19, 4, 3]) cube([1, 1, 1]);
    translate([19, 5, 3]) cube([1, 1, 1]);
    translate([19, 6, 3]) cube([1, 1, 1]);
    translate([19, 7, 3]) cube([1, 1, 1]);
    translate([19, 8, 3]) cube([1, 1, 1]);
    translate([19, 9, 3]) cube([1, 1, 1]);
    translate([19, 10, 3]) cube([1, 1, 1]);
    translate([19, 11, 3]) cube([1, 1, 1]);
    translate([19, 12, 3]) cube([1, 1, 1]);
    translate([19, 13, 3]) cube([1, 1, 1]);
    translate([19, 14, 3]) cube([1, 1, 1]);
    translate([19, 15, 3]) cube([1, 1, 1]);
    translate([19, 16, 3]) cube([1, 1, 1]);
    translate([19, 17, 3]) cube([1, 1, 1]);
    translate([19, 18, 3]) cube([1, 1, 1]);
    translate([19, 19, 3]) cube([1, 1, 1]);
    translate([0, 0, 4]) cube([1, 1, 1]);
    translate([10, 0, 4]) cube([1, 1, 1]);
    translate([11, 0, 4]) cube([1, 1, 1]);
    translate([12, 0, 4]) cube([1, 1, 1]);
    translate([14, 0, 4]) cube([1, 1, 1]);
    translate([15, 0, 4]) cube([1, 1, 1]);
    translate([16, 0, 4]) cube([1, 1, 1]);
    translate([17, 0, 4]) cube([1, 1, 1]);
    translate([18, 0, 4]) cube([1, 1, 1]);
    translate([19, 0, 4]) cube([1, 1, 1]);
    translate([10, 1, 4]) cube([1, 1, 1]);
}
